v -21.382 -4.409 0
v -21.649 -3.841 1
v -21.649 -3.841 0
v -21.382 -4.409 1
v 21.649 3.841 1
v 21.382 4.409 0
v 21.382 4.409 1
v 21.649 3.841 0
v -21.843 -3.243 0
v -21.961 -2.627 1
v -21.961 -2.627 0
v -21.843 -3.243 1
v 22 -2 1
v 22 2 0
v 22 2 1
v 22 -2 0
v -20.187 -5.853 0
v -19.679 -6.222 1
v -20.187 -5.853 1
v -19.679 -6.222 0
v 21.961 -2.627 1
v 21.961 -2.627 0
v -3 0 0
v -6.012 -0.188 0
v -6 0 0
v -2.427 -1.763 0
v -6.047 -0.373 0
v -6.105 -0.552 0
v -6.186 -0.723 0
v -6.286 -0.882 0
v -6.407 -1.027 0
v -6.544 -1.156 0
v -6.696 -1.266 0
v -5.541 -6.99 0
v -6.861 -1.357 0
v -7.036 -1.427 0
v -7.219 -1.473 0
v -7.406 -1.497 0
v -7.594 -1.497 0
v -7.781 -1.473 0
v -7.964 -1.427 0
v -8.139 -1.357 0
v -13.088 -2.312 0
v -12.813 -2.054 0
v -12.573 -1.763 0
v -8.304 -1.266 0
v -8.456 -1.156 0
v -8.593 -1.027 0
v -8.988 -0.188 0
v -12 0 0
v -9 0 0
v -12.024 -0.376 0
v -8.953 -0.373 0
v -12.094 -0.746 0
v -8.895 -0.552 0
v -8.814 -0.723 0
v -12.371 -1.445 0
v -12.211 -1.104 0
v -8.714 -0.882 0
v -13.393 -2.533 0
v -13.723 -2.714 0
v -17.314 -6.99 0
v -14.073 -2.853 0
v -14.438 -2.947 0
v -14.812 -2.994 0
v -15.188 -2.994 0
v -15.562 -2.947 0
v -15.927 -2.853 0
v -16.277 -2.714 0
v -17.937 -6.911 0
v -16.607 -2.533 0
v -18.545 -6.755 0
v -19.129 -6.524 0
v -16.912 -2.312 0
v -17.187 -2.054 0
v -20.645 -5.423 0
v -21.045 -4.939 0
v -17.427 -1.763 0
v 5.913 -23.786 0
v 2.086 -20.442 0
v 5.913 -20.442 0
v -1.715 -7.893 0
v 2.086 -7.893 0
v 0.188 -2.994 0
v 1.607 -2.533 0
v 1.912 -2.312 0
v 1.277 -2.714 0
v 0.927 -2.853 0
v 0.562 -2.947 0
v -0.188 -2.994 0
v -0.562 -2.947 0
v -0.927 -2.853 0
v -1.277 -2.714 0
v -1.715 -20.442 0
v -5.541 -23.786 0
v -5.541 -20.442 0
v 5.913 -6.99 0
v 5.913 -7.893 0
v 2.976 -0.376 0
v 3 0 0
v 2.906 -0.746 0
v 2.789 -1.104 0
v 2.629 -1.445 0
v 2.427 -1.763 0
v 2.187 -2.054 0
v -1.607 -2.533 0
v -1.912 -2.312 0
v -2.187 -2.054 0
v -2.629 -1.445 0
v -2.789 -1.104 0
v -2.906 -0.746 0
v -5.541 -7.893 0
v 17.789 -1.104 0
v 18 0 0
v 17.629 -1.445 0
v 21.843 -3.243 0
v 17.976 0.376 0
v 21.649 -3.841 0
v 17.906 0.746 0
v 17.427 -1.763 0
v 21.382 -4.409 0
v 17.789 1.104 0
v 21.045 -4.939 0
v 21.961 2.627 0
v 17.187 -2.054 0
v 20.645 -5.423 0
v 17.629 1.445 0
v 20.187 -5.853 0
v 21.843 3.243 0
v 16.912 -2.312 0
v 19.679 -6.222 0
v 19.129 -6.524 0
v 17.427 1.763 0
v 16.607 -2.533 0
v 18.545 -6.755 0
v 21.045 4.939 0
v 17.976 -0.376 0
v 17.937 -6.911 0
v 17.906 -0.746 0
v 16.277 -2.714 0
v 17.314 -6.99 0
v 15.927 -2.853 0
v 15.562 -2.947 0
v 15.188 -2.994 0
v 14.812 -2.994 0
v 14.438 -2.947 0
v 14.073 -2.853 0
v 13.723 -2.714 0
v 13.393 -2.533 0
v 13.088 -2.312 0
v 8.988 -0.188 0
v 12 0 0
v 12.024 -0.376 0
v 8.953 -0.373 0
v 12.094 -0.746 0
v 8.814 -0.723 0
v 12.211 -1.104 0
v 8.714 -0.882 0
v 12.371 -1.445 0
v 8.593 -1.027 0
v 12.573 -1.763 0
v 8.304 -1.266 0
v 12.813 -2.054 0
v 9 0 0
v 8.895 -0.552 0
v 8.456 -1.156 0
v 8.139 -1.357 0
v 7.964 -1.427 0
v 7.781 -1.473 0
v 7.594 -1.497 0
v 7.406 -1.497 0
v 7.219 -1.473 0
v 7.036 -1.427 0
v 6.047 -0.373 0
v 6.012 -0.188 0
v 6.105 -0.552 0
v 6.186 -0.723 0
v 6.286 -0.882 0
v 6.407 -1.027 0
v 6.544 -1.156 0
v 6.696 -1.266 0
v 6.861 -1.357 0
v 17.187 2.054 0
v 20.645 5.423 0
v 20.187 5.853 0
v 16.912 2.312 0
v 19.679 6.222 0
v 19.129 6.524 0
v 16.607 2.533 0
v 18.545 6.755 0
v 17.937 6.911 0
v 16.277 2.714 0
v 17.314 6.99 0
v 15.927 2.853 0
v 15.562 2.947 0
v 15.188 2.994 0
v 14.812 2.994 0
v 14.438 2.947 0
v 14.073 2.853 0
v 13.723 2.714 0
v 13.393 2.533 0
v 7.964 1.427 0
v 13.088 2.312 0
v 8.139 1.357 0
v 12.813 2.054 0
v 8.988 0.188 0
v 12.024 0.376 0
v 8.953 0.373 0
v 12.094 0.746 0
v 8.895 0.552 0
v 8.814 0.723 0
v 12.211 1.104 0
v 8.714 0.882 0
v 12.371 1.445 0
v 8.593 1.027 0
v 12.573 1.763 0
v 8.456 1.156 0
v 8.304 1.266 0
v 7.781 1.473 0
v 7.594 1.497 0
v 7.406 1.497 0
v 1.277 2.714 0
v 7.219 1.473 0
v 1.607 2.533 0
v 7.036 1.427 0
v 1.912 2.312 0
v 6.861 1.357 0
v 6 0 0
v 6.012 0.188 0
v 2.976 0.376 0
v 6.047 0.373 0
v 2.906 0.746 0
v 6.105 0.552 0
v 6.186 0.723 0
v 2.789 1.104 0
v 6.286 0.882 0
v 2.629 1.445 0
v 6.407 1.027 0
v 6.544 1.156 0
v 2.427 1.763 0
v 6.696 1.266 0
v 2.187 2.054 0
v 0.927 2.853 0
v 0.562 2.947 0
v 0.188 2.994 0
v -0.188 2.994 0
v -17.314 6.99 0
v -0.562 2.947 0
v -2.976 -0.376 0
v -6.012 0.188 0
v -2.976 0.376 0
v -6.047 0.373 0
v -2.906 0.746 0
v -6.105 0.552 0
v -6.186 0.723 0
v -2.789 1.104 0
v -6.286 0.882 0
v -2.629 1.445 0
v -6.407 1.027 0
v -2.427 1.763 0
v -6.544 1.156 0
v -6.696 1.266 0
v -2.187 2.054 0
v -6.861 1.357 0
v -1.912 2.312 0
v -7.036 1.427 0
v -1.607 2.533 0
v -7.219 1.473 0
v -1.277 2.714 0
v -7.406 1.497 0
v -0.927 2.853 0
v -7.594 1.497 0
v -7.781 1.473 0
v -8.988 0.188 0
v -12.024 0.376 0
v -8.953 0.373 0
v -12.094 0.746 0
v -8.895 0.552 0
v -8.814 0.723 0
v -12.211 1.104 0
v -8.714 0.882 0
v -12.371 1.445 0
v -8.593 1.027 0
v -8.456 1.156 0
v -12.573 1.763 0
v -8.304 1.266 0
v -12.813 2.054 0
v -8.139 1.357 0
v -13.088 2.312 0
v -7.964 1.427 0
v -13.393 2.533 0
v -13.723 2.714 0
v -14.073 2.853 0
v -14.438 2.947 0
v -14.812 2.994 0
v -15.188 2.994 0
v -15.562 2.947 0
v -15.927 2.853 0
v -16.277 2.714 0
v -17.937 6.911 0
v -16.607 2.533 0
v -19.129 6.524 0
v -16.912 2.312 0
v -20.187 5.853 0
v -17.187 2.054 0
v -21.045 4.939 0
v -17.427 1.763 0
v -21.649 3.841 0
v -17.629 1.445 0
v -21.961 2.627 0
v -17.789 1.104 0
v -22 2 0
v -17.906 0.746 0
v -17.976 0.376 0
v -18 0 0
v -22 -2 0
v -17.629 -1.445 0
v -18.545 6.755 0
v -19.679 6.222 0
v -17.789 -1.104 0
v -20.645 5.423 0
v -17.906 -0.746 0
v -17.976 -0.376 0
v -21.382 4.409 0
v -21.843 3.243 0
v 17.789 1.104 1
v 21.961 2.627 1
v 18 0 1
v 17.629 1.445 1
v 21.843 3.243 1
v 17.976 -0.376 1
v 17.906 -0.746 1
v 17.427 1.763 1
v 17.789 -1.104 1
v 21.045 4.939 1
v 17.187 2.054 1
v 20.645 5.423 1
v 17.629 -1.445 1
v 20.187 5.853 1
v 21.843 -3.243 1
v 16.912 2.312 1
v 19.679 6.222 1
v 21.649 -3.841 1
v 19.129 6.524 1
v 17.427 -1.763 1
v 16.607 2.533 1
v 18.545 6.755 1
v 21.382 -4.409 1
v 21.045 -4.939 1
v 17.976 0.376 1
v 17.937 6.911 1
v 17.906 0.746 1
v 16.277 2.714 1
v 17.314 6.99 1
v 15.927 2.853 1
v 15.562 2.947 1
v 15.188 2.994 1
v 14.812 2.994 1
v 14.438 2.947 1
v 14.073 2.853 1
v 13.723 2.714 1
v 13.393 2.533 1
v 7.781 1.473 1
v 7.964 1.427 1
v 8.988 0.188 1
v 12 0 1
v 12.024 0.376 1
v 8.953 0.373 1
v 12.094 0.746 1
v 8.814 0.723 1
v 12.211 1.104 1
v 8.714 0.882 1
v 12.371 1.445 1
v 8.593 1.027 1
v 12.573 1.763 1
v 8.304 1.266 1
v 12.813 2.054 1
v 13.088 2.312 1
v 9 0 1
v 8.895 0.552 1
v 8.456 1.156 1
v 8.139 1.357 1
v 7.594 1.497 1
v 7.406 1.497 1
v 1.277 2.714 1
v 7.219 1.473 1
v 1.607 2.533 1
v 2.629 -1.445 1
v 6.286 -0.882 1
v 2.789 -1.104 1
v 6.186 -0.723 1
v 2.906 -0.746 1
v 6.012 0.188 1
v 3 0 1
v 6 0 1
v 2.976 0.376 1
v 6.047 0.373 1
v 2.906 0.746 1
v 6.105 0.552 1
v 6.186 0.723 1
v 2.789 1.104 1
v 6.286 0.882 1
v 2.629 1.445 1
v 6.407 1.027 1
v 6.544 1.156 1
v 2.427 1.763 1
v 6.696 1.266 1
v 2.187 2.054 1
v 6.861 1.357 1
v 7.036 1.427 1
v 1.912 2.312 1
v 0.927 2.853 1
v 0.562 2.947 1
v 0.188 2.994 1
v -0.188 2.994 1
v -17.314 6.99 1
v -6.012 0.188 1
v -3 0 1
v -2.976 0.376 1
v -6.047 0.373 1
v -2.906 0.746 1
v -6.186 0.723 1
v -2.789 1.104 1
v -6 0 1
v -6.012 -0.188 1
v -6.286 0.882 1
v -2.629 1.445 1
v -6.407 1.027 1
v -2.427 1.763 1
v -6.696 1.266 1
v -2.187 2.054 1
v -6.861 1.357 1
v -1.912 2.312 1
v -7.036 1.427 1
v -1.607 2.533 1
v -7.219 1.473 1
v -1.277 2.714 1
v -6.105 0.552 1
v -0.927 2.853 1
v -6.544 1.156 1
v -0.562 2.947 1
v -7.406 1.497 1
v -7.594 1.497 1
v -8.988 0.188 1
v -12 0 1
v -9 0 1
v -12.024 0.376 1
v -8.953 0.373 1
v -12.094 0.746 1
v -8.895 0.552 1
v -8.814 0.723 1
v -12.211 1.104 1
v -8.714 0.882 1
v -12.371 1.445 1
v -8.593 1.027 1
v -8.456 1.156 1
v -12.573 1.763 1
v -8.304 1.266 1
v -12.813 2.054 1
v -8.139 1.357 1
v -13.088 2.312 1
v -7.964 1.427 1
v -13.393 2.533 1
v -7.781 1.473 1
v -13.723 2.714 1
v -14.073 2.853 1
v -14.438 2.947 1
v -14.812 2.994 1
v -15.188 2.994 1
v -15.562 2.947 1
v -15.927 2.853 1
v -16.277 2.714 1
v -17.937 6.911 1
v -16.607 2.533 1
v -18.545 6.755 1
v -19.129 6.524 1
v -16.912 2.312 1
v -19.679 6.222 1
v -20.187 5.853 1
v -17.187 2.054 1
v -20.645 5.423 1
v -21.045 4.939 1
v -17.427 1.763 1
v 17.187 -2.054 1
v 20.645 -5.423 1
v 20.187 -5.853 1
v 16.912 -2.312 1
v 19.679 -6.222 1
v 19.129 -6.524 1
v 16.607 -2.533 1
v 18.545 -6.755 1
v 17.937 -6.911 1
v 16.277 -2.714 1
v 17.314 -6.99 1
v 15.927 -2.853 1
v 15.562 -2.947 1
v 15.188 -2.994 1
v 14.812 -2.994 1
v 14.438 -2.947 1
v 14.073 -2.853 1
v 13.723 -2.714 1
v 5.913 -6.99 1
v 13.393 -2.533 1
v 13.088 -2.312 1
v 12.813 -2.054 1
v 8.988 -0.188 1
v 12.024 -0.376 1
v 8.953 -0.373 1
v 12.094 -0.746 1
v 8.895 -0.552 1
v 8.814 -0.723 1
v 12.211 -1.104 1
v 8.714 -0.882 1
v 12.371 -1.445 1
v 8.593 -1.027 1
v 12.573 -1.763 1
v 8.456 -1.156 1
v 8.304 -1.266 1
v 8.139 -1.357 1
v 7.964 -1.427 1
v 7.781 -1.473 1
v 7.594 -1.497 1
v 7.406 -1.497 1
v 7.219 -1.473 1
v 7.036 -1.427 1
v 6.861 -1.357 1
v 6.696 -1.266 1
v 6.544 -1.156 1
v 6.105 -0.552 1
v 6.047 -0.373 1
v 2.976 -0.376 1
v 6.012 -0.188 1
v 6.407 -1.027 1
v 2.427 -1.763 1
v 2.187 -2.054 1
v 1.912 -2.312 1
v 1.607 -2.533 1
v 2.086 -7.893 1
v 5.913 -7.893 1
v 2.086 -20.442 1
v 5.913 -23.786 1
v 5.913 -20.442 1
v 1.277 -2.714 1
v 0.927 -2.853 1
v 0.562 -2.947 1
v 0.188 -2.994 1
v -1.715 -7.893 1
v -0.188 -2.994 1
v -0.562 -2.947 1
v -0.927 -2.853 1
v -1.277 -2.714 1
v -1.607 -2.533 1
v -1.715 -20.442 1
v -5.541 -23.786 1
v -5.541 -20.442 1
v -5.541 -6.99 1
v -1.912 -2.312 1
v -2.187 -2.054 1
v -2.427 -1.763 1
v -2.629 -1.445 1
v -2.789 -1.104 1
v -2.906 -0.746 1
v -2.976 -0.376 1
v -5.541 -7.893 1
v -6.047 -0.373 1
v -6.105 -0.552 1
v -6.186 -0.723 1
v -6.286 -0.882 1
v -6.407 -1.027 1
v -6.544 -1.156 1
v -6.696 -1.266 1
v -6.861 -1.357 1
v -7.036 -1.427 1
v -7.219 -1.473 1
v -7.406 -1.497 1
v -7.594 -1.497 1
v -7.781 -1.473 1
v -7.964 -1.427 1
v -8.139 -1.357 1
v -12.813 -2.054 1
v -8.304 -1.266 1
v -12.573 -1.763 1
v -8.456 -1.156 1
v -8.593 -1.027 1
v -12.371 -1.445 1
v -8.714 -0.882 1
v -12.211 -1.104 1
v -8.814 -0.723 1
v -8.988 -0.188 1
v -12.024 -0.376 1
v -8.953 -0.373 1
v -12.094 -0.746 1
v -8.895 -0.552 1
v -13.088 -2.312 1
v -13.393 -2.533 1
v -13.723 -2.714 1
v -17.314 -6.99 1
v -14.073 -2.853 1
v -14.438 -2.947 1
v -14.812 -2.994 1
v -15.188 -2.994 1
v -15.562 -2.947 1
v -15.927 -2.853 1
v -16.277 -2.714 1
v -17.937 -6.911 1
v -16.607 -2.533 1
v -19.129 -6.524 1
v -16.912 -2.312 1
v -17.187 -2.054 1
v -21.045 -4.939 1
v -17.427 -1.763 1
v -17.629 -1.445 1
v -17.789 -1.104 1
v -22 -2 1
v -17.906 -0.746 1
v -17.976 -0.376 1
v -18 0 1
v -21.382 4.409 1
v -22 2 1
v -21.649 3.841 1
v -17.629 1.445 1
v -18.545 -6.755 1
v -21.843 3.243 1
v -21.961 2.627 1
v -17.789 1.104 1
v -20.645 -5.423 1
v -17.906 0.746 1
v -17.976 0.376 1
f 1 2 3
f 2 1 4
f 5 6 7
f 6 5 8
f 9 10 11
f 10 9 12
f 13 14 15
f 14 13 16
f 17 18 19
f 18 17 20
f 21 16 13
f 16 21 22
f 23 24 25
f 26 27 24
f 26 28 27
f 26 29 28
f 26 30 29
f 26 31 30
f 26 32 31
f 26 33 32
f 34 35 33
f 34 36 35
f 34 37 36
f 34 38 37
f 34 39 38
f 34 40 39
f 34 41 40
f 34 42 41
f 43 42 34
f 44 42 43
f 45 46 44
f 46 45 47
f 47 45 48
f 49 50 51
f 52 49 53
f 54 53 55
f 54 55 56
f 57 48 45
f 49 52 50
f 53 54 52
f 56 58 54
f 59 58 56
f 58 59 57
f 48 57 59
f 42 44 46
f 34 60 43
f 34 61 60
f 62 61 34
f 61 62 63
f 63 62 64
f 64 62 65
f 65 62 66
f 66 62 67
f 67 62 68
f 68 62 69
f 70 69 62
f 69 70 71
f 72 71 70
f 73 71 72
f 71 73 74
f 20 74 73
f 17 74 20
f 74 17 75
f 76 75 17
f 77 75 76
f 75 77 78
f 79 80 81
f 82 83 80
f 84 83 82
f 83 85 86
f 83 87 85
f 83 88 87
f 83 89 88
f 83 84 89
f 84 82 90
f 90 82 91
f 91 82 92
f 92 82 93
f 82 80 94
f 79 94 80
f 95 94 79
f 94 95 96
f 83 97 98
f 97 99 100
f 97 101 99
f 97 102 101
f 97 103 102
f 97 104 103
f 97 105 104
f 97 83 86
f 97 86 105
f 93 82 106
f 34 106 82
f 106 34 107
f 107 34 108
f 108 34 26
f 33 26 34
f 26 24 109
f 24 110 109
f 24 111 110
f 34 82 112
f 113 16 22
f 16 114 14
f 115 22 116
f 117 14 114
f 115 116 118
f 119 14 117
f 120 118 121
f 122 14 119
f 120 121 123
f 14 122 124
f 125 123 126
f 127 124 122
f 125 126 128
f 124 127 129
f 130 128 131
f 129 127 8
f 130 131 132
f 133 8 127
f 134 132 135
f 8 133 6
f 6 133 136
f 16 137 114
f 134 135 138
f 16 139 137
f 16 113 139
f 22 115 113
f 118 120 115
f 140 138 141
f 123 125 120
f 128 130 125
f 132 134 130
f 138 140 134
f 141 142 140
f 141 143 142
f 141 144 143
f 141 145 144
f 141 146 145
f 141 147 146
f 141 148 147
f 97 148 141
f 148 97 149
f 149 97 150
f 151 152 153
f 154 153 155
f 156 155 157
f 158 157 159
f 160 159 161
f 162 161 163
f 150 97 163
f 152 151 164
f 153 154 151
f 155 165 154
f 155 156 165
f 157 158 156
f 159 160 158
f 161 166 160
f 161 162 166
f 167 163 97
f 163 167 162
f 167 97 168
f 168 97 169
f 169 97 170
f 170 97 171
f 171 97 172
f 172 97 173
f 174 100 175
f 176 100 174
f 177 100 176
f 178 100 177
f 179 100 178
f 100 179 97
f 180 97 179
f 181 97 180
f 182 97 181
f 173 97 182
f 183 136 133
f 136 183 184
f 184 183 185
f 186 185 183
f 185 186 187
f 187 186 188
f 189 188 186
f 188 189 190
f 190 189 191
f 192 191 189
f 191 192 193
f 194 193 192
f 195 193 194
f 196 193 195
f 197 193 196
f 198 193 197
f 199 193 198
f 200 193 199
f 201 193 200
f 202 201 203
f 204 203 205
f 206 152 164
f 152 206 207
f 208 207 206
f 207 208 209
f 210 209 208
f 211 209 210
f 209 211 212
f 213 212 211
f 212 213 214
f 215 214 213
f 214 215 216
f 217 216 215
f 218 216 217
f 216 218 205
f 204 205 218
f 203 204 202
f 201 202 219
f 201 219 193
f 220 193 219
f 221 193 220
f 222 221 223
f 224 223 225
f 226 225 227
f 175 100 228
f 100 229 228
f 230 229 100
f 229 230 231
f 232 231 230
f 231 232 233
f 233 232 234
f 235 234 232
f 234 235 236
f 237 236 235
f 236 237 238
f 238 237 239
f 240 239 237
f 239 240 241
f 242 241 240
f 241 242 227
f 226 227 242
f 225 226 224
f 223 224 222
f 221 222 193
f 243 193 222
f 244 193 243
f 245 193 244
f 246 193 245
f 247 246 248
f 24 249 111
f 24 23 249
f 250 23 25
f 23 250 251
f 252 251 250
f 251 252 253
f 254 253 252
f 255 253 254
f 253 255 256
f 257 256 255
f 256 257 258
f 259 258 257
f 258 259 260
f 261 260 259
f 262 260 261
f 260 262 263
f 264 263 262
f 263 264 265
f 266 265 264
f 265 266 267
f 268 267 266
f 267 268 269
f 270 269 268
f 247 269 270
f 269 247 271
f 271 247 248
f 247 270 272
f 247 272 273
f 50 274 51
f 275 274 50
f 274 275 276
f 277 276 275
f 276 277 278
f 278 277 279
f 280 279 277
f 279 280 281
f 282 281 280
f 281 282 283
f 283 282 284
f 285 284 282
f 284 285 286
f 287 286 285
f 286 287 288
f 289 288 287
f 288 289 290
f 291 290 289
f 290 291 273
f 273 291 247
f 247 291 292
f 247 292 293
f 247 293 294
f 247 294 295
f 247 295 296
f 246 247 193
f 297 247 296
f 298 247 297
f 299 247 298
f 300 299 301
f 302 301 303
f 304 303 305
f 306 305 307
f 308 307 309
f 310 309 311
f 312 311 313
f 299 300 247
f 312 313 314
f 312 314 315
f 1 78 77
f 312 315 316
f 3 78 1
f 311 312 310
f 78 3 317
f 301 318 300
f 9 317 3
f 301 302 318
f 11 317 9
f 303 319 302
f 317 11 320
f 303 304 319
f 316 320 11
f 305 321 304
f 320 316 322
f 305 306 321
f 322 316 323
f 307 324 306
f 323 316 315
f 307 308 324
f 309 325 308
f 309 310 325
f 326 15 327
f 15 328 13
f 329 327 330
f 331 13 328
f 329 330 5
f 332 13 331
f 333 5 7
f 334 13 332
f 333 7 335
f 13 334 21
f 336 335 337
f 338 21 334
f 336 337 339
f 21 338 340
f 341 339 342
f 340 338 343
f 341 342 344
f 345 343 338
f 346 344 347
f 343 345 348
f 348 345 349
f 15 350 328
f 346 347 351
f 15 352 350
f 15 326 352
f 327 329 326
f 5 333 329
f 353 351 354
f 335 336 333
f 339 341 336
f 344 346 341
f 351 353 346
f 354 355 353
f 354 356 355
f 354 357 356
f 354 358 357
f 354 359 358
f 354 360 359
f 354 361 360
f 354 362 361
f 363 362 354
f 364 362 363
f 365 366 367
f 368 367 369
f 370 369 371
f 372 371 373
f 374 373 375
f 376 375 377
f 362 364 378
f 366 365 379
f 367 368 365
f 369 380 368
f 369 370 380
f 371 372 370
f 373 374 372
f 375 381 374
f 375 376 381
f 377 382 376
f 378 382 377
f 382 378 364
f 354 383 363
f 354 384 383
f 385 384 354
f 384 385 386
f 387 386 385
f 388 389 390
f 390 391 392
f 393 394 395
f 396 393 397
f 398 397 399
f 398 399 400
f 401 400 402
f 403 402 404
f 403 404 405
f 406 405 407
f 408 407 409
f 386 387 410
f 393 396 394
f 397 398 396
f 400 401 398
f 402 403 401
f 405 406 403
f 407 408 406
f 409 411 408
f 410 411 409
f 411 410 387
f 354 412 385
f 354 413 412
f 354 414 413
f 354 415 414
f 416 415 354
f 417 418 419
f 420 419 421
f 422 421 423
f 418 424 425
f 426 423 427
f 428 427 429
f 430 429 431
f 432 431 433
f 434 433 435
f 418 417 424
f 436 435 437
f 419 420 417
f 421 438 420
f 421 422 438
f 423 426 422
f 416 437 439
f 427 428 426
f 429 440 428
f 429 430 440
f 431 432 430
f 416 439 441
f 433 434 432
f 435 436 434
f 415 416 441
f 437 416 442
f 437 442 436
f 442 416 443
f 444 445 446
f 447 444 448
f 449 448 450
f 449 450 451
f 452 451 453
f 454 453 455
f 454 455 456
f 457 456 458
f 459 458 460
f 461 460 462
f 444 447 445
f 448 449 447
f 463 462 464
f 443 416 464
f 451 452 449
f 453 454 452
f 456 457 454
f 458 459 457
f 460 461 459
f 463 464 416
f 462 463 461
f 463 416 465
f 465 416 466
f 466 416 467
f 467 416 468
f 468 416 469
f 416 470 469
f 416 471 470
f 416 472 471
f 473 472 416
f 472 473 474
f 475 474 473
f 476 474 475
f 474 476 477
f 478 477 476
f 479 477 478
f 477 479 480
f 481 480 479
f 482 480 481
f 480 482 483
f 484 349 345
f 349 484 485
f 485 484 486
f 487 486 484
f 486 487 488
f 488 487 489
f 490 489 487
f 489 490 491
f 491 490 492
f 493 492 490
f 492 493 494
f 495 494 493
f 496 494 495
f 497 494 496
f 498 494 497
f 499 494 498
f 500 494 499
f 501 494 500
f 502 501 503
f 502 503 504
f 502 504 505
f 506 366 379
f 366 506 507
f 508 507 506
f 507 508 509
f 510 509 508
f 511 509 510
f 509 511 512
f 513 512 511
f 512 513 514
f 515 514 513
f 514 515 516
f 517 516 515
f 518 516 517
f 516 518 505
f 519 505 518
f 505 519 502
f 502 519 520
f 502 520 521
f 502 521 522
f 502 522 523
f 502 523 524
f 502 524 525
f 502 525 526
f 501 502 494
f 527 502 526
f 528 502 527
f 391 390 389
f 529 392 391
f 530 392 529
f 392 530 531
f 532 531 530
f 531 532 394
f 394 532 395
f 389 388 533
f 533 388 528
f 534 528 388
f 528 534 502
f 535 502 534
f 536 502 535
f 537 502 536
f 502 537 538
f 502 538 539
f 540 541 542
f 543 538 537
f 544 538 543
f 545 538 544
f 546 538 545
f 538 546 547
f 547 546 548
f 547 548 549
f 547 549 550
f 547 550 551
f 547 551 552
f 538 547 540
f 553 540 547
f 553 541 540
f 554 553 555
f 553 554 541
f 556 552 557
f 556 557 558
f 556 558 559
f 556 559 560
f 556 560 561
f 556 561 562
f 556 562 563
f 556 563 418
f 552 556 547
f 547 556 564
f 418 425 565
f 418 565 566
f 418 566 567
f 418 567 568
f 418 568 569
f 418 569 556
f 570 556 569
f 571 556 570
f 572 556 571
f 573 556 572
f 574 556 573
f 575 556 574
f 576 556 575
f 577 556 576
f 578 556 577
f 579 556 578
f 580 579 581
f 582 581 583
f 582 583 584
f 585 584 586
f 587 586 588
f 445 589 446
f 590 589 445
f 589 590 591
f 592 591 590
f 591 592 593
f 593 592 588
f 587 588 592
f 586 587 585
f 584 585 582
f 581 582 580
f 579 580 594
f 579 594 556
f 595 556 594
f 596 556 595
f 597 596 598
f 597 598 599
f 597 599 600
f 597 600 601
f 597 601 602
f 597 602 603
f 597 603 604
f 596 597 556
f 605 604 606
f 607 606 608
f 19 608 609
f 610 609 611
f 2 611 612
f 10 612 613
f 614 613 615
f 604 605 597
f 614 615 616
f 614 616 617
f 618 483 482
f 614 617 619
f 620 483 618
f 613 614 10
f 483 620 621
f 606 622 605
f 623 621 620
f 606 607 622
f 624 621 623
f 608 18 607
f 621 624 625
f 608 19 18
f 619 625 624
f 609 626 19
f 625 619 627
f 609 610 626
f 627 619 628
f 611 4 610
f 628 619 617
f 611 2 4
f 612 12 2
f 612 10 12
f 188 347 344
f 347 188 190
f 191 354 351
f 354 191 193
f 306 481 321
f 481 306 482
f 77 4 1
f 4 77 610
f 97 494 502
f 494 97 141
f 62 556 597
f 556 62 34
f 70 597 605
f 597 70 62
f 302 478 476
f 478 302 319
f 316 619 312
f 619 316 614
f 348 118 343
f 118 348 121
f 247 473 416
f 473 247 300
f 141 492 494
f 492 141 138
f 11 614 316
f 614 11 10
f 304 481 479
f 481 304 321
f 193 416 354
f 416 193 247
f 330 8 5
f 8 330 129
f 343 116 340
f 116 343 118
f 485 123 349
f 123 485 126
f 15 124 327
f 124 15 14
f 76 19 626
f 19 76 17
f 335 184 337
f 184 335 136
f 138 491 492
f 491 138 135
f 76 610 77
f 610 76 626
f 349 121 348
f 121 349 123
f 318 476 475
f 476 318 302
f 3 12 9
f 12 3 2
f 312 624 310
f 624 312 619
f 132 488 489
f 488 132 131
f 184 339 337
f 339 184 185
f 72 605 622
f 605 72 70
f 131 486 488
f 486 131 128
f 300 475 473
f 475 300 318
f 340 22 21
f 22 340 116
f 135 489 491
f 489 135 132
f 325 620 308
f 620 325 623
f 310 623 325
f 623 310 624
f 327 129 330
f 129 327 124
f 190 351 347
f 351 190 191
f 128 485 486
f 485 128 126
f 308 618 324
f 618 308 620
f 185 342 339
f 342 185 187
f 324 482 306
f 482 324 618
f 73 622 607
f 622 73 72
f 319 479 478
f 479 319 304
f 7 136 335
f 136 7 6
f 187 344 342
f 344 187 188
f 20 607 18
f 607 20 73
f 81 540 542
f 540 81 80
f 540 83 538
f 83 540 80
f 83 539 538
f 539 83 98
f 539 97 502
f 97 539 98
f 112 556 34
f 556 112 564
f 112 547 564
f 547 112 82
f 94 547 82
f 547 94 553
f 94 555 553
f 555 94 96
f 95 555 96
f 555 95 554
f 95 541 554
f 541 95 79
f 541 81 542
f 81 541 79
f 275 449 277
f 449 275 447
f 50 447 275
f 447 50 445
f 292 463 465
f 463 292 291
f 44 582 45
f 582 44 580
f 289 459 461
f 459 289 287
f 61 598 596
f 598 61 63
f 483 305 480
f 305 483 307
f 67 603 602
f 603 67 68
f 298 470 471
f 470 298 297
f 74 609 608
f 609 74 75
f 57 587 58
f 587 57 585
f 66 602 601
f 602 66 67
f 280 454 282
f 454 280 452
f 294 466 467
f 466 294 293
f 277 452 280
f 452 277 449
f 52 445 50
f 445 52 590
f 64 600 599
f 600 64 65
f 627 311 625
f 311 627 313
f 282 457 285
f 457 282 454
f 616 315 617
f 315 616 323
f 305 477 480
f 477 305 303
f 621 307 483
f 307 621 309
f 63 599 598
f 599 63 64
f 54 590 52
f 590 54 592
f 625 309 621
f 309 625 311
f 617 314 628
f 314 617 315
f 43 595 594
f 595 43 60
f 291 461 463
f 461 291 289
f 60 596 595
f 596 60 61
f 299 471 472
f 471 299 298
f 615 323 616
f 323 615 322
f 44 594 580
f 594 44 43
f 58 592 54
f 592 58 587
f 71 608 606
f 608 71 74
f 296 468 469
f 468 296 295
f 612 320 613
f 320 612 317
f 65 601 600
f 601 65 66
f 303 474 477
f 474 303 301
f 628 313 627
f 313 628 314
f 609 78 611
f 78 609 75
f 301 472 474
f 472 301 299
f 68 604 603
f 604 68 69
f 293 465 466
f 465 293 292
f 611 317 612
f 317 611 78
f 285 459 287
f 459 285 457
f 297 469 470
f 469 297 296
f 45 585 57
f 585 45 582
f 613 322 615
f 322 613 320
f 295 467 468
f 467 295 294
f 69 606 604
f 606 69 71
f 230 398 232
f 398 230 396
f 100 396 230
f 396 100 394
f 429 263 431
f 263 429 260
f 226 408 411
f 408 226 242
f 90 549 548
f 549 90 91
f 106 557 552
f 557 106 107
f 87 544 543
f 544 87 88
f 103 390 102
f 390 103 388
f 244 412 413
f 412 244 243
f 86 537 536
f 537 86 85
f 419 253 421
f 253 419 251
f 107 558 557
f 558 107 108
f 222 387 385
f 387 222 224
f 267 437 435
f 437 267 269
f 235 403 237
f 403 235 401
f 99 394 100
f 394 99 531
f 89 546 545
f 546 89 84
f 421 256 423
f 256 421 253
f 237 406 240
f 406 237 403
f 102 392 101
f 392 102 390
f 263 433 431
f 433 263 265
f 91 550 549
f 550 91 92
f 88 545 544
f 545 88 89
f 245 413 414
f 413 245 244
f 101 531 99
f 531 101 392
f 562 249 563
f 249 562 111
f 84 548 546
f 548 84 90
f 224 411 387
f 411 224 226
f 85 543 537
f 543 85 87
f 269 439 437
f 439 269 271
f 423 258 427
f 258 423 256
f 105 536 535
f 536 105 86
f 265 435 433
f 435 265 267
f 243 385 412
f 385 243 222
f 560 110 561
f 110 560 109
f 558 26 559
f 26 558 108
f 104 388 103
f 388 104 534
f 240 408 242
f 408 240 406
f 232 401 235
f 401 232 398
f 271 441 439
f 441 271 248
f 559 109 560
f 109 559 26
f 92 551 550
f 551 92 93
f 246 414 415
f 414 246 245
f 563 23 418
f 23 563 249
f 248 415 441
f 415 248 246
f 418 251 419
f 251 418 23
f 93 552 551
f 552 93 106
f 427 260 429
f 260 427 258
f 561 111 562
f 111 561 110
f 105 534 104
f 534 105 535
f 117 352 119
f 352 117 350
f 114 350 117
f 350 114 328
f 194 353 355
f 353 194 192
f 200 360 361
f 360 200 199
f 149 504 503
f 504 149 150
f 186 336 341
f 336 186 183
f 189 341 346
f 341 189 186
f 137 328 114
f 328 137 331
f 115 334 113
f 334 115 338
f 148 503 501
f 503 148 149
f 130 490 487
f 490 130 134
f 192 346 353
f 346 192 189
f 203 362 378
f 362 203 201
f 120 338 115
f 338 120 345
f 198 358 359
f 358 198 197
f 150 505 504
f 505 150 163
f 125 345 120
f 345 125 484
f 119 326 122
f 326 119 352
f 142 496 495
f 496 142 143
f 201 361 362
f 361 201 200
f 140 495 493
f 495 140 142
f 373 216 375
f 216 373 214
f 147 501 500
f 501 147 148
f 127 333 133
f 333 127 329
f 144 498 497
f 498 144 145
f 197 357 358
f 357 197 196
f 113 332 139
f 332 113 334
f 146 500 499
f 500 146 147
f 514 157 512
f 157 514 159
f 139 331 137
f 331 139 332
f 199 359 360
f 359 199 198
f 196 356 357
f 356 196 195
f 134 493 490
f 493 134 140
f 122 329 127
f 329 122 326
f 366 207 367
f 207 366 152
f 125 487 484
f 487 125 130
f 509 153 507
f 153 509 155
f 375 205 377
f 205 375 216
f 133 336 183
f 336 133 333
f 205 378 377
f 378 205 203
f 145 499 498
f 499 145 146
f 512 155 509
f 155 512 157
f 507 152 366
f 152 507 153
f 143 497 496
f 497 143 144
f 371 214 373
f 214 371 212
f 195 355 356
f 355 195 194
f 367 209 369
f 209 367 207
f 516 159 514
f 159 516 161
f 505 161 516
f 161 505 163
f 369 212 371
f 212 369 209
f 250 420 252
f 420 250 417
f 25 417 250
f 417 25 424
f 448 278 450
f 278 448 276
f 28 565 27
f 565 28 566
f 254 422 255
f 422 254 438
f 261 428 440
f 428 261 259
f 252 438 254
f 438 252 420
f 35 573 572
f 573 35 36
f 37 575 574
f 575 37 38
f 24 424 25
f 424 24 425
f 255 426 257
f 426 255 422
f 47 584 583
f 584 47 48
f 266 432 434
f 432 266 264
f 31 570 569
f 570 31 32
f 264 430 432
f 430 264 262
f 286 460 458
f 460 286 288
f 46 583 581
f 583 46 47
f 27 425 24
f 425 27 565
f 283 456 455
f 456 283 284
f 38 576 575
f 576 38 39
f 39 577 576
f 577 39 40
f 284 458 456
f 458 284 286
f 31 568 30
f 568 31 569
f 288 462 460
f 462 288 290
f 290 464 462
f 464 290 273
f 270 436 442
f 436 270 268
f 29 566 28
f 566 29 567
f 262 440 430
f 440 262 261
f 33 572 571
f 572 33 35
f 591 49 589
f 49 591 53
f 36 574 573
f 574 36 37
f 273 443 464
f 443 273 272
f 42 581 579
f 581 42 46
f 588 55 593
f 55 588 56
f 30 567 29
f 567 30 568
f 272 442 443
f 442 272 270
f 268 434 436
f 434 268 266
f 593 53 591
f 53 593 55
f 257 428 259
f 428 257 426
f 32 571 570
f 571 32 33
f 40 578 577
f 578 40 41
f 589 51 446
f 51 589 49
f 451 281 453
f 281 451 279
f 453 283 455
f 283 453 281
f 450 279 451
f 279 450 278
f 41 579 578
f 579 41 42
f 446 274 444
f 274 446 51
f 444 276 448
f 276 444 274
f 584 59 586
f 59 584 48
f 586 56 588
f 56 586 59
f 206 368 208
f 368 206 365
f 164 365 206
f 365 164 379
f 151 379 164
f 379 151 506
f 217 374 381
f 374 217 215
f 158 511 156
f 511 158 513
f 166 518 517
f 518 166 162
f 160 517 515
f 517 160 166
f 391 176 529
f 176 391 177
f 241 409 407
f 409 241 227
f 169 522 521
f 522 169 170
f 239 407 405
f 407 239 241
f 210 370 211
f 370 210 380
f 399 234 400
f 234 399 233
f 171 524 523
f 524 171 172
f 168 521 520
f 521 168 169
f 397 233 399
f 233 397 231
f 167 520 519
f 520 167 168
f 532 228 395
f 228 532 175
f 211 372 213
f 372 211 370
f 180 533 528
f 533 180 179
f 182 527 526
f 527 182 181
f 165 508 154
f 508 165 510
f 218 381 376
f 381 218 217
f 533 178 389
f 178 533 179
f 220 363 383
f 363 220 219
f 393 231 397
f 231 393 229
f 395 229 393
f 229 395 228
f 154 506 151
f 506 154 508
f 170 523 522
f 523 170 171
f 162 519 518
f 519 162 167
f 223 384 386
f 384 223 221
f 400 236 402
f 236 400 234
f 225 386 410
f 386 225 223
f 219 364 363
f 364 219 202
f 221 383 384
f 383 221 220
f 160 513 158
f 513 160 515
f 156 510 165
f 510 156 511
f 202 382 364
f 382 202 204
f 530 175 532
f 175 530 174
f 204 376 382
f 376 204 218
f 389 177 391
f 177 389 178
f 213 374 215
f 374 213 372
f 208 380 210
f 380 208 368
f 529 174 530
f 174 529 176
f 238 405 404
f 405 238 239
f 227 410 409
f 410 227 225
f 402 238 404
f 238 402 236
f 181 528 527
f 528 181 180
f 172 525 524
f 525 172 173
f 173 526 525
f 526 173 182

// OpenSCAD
$fn = 50;


difference() {
	union() {
		hull() {
			translate(v = [-17.0000000000, 2.0000000000, 0]) {
				cylinder(h = 1, r = 5);
			}
			translate(v = [17.0000000000, 2.0000000000, 0]) {
				cylinder(h = 1, r = 5);
			}
			translate(v = [-17.0000000000, -2.0000000000, 0]) {
				cylinder(h = 1, r = 5);
			}
			translate(v = [17.0000000000, -2.0000000000, 0]) {
				cylinder(h = 1, r = 5);
			}
		}
		translate(v = [0, -5, 0]) {
			linear_extrude(height = 1) {
				text(font = "DejaVu Sans Mono:style=Bold", halign = "center", size = 19.0000000000, text = "I", valign = "top");
			}
		}
	}
	union() {
		translate(v = [-15.0000000000, 0.0000000000, 0]) {
			translate(v = [0, 0, -100]) {
				cylinder(h = 200, r = 3.0000000000);
			}
		}
		translate(v = [0, 0, -100]) {
			cylinder(h = 200, r = 3.0000000000);
		}
		translate(v = [15.0000000000, 0.0000000000, 0]) {
			translate(v = [0, 0, -100]) {
				cylinder(h = 200, r = 3.0000000000);
			}
		}
		translate(v = [-15.0000000000, 0.0000000000, 0]) {
			translate(v = [0, 0, -100]) {
				cylinder(h = 200, r = 1.5000000000);
			}
		}
		translate(v = [-7.5000000000, 0.0000000000, 0]) {
			translate(v = [0, 0, -100]) {
				cylinder(h = 200, r = 1.5000000000);
			}
		}
		translate(v = [0, 0, -100]) {
			cylinder(h = 200, r = 1.5000000000);
		}
		translate(v = [7.5000000000, 0.0000000000, 0]) {
			translate(v = [0, 0, -100]) {
				cylinder(h = 200, r = 1.5000000000);
			}
		}
		translate(v = [15.0000000000, 0.0000000000, 0]) {
			translate(v = [0, 0, -100]) {
				cylinder(h = 200, r = 1.5000000000);
			}
		}
	}
}
